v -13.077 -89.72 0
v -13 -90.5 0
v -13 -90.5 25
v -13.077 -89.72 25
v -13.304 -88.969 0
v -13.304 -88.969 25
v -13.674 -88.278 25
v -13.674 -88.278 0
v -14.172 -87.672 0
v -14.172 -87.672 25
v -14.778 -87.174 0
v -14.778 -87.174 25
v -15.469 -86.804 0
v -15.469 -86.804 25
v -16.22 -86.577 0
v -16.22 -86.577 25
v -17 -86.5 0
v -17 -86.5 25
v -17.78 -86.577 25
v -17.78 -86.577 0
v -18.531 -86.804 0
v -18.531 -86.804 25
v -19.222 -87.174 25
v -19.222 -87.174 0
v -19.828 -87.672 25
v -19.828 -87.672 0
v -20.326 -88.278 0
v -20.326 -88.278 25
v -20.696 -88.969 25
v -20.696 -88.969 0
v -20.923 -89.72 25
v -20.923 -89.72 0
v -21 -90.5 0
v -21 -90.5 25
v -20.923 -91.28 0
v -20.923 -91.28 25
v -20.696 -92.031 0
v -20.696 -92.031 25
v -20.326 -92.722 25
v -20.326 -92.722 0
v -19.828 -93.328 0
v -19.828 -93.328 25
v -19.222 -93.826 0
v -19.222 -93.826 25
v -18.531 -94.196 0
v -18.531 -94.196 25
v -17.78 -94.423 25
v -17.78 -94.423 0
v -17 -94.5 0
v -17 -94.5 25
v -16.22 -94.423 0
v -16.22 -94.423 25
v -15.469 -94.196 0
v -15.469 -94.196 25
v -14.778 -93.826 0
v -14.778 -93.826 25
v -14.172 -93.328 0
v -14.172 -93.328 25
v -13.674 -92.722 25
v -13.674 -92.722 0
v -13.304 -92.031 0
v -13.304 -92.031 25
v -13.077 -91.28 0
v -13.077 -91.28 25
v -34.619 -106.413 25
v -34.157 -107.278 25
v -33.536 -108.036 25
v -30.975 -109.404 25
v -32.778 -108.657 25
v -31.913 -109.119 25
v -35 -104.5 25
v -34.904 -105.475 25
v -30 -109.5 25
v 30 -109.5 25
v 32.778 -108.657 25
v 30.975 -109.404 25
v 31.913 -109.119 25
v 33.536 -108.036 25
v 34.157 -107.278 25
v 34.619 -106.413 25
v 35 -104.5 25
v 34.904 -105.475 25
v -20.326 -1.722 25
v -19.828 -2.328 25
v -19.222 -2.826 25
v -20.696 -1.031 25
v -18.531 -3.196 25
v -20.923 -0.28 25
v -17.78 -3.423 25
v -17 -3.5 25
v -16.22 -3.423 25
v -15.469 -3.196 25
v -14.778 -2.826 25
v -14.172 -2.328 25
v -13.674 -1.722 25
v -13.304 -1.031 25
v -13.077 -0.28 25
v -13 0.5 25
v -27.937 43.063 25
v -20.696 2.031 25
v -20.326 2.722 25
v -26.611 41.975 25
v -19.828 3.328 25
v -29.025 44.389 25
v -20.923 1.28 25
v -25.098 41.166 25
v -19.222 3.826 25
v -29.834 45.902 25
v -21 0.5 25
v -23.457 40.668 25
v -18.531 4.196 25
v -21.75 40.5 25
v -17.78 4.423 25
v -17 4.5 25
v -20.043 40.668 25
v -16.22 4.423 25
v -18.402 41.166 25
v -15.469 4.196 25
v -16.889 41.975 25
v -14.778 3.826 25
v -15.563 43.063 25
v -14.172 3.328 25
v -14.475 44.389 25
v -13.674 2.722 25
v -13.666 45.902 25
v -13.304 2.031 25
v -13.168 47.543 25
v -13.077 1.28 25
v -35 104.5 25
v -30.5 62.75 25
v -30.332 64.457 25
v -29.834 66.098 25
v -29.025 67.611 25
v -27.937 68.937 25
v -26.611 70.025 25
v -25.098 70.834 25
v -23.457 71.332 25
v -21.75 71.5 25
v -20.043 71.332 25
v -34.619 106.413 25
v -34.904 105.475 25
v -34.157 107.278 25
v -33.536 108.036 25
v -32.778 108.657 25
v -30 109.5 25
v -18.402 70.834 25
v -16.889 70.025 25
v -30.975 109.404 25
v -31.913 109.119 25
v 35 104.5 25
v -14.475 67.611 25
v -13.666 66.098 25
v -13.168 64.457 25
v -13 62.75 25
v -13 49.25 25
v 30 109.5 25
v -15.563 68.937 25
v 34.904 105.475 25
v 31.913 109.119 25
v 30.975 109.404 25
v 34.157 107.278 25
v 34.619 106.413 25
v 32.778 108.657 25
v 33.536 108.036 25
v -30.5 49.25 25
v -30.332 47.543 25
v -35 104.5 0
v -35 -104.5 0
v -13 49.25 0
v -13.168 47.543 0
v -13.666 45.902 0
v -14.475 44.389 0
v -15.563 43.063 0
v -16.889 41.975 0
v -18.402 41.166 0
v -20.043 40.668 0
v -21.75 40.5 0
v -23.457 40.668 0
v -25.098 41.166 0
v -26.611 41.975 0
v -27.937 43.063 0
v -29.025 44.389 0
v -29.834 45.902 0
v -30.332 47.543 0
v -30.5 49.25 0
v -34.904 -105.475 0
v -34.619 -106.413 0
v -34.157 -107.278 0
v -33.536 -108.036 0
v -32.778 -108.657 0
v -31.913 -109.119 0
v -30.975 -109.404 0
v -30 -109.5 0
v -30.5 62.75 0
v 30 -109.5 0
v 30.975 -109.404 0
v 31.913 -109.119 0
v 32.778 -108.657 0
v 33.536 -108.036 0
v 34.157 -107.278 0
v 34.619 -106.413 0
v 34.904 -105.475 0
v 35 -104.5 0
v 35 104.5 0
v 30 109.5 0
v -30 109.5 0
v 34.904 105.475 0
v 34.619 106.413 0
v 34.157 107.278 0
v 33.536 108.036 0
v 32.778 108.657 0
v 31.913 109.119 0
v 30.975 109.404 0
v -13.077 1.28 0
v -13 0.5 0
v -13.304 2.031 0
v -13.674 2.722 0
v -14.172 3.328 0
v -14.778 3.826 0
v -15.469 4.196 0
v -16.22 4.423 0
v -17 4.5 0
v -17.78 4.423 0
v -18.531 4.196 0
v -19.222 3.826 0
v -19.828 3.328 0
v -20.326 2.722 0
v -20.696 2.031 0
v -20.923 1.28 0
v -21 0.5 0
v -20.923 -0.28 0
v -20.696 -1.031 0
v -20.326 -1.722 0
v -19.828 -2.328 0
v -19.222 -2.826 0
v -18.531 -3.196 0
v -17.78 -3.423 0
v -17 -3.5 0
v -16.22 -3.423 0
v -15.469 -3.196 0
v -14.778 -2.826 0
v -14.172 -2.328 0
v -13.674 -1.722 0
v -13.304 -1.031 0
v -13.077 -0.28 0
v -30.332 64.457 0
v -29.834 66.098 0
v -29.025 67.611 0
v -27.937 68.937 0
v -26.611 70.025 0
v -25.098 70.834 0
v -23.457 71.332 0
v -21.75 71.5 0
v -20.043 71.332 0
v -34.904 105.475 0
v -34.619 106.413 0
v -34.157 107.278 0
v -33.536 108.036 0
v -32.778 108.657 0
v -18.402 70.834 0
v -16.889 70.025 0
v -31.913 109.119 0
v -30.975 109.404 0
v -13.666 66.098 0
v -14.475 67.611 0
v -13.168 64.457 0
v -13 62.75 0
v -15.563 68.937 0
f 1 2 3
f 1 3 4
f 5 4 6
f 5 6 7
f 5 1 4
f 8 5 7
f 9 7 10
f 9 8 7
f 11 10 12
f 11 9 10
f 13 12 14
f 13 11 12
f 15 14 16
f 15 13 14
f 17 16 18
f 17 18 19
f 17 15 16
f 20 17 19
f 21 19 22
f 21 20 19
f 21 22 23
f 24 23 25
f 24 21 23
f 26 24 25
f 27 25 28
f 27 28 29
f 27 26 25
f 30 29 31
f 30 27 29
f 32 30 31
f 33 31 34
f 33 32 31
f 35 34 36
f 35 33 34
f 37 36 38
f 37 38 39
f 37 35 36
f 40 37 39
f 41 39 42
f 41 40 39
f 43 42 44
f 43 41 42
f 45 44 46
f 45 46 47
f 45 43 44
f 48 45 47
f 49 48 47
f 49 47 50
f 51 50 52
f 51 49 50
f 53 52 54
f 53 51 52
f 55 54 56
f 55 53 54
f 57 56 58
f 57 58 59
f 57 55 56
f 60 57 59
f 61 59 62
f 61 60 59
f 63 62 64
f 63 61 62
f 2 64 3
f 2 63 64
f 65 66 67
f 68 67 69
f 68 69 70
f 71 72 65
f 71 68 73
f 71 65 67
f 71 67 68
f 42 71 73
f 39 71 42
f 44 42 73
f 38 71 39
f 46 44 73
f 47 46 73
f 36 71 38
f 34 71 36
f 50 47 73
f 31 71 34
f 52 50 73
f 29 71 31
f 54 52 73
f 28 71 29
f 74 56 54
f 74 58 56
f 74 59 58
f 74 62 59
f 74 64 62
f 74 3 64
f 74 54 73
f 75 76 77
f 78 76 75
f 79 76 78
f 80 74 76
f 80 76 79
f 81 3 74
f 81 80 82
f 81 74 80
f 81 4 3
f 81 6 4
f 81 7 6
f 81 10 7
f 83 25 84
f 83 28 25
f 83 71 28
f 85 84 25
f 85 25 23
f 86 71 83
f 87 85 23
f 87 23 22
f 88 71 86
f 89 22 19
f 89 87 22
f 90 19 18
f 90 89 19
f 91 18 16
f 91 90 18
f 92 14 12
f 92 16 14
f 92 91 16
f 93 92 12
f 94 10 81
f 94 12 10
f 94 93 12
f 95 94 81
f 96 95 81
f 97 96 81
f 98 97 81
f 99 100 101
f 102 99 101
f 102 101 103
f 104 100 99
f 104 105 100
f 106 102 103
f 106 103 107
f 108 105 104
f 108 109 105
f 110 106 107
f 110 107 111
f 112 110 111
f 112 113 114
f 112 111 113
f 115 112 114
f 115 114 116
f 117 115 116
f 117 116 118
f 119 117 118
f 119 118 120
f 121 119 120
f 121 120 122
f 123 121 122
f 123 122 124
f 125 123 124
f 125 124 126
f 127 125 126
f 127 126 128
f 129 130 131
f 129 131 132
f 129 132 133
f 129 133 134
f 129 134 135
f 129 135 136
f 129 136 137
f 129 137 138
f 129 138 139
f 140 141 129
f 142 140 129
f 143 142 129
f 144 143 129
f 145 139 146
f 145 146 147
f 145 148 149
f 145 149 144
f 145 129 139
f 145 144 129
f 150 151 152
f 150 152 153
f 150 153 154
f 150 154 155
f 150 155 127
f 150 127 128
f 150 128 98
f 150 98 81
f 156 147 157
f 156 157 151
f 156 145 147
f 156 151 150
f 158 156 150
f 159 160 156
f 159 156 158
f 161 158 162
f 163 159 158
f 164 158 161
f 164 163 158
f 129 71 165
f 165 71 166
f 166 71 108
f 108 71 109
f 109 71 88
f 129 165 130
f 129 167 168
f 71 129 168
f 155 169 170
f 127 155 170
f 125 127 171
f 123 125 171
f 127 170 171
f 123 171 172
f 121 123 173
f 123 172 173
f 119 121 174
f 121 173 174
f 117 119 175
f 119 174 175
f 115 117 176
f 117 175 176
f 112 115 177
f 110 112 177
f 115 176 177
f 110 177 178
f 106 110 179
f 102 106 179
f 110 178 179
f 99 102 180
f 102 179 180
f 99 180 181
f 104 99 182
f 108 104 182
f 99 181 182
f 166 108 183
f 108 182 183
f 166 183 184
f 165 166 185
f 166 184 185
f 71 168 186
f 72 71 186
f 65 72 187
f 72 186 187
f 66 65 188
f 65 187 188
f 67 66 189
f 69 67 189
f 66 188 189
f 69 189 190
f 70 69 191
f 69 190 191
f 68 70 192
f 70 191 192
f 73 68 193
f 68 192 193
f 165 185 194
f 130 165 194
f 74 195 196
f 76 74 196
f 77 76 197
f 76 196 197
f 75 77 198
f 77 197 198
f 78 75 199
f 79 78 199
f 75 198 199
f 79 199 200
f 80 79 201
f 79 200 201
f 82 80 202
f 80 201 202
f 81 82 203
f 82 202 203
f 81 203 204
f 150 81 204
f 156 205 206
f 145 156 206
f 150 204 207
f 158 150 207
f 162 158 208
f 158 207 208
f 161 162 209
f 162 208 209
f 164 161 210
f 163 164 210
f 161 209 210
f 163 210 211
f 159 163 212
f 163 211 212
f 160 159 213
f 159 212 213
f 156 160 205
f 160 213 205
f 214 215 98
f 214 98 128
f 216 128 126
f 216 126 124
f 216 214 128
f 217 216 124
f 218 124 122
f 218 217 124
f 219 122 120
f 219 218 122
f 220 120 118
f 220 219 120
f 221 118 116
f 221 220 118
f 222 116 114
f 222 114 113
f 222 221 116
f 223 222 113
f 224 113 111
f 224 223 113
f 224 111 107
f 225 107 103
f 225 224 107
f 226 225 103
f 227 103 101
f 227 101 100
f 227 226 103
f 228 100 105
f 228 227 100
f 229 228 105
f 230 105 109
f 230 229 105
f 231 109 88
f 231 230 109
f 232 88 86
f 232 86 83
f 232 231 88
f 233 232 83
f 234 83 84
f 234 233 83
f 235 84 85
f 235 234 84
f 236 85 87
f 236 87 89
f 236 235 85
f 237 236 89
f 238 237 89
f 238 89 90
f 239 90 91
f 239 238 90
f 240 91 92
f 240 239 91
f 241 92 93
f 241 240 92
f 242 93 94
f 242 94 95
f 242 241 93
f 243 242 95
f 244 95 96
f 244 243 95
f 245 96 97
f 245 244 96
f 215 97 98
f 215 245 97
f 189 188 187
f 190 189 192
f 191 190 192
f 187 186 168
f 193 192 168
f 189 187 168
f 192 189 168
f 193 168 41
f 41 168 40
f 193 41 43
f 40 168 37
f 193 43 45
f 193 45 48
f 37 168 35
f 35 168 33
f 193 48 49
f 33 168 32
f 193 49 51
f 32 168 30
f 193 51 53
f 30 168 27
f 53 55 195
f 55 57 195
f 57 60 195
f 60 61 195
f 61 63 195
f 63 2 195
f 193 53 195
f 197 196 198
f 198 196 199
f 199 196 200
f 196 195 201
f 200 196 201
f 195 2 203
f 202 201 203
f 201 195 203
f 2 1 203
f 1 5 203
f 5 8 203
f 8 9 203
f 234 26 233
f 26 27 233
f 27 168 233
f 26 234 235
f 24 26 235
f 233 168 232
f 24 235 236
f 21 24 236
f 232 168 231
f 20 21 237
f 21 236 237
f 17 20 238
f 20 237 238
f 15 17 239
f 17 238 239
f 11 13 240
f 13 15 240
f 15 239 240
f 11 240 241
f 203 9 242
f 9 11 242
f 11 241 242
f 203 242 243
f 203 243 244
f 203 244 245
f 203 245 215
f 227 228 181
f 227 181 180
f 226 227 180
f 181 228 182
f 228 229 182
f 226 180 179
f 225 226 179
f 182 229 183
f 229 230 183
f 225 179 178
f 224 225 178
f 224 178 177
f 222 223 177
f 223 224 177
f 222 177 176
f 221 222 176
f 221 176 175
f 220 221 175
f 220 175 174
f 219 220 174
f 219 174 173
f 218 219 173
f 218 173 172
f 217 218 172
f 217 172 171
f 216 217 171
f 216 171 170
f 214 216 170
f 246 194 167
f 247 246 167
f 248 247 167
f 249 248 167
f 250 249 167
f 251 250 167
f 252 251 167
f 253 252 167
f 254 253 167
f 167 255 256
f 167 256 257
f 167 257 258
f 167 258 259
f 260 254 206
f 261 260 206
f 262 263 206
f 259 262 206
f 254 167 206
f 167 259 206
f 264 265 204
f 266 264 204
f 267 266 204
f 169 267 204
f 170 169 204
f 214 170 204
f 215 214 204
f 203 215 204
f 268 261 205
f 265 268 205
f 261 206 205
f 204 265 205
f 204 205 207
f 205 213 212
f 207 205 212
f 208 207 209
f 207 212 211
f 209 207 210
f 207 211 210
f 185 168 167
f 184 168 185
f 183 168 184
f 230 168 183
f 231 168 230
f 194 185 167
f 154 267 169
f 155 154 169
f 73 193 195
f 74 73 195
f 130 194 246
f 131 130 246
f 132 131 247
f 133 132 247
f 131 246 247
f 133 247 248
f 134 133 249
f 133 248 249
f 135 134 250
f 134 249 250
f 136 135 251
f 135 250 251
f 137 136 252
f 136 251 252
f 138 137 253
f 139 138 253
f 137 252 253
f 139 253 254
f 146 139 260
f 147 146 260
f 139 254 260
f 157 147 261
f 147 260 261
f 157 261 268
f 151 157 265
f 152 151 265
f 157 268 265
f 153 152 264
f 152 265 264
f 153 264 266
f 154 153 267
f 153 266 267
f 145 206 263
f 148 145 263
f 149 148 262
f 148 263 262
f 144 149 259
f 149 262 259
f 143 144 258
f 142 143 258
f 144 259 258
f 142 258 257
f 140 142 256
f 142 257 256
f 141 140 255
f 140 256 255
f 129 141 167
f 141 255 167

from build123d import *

# Parameters (mm, degrees)
F0_R     = 4
F1_DEPTH = 25


with BuildPart() as f1:
    # F0 (on Top) → F1 (new body)
    with BuildSketch(Plane.XY):
        with BuildLine():
            ThreePointArc((-35, -104.5), (-33.535534, -108.035534), (-30, -109.5))
            Line((-30, -109.5), (30, -109.5))
            ThreePointArc((30, -109.5), (33.535534, -108.035534), (35, -104.5))
            Line((35, -104.5), (35, 104.5))
            ThreePointArc((35, 104.5), (33.535534, 108.035534), (30, 109.5))
            Line((30, 109.5), (-30, 109.5))
            ThreePointArc((-30, 109.5), (-33.535534, 108.035534), (-35, 104.5))
            Line((-35, 104.5), (-35, -104.5))
        make_face()
        with Locations((-17, -90.5)):
            Circle(F0_R, mode=Mode.SUBTRACT)
        with Locations((-17, 0.5)):
            Circle(F0_R, mode=Mode.SUBTRACT)
        with BuildLine():
            ThreePointArc((-30.5, 62.75), (-21.75, 71.5), (-13, 62.75))
            Line((-13, 62.75), (-13, 49.25))
            ThreePointArc((-13, 49.25), (-21.75, 40.5), (-30.5, 49.25))
            Line((-30.5, 49.25), (-30.5, 62.75))
        make_face(mode=Mode.SUBTRACT)
    extrude(amount=F1_DEPTH)


solid = f1.part
